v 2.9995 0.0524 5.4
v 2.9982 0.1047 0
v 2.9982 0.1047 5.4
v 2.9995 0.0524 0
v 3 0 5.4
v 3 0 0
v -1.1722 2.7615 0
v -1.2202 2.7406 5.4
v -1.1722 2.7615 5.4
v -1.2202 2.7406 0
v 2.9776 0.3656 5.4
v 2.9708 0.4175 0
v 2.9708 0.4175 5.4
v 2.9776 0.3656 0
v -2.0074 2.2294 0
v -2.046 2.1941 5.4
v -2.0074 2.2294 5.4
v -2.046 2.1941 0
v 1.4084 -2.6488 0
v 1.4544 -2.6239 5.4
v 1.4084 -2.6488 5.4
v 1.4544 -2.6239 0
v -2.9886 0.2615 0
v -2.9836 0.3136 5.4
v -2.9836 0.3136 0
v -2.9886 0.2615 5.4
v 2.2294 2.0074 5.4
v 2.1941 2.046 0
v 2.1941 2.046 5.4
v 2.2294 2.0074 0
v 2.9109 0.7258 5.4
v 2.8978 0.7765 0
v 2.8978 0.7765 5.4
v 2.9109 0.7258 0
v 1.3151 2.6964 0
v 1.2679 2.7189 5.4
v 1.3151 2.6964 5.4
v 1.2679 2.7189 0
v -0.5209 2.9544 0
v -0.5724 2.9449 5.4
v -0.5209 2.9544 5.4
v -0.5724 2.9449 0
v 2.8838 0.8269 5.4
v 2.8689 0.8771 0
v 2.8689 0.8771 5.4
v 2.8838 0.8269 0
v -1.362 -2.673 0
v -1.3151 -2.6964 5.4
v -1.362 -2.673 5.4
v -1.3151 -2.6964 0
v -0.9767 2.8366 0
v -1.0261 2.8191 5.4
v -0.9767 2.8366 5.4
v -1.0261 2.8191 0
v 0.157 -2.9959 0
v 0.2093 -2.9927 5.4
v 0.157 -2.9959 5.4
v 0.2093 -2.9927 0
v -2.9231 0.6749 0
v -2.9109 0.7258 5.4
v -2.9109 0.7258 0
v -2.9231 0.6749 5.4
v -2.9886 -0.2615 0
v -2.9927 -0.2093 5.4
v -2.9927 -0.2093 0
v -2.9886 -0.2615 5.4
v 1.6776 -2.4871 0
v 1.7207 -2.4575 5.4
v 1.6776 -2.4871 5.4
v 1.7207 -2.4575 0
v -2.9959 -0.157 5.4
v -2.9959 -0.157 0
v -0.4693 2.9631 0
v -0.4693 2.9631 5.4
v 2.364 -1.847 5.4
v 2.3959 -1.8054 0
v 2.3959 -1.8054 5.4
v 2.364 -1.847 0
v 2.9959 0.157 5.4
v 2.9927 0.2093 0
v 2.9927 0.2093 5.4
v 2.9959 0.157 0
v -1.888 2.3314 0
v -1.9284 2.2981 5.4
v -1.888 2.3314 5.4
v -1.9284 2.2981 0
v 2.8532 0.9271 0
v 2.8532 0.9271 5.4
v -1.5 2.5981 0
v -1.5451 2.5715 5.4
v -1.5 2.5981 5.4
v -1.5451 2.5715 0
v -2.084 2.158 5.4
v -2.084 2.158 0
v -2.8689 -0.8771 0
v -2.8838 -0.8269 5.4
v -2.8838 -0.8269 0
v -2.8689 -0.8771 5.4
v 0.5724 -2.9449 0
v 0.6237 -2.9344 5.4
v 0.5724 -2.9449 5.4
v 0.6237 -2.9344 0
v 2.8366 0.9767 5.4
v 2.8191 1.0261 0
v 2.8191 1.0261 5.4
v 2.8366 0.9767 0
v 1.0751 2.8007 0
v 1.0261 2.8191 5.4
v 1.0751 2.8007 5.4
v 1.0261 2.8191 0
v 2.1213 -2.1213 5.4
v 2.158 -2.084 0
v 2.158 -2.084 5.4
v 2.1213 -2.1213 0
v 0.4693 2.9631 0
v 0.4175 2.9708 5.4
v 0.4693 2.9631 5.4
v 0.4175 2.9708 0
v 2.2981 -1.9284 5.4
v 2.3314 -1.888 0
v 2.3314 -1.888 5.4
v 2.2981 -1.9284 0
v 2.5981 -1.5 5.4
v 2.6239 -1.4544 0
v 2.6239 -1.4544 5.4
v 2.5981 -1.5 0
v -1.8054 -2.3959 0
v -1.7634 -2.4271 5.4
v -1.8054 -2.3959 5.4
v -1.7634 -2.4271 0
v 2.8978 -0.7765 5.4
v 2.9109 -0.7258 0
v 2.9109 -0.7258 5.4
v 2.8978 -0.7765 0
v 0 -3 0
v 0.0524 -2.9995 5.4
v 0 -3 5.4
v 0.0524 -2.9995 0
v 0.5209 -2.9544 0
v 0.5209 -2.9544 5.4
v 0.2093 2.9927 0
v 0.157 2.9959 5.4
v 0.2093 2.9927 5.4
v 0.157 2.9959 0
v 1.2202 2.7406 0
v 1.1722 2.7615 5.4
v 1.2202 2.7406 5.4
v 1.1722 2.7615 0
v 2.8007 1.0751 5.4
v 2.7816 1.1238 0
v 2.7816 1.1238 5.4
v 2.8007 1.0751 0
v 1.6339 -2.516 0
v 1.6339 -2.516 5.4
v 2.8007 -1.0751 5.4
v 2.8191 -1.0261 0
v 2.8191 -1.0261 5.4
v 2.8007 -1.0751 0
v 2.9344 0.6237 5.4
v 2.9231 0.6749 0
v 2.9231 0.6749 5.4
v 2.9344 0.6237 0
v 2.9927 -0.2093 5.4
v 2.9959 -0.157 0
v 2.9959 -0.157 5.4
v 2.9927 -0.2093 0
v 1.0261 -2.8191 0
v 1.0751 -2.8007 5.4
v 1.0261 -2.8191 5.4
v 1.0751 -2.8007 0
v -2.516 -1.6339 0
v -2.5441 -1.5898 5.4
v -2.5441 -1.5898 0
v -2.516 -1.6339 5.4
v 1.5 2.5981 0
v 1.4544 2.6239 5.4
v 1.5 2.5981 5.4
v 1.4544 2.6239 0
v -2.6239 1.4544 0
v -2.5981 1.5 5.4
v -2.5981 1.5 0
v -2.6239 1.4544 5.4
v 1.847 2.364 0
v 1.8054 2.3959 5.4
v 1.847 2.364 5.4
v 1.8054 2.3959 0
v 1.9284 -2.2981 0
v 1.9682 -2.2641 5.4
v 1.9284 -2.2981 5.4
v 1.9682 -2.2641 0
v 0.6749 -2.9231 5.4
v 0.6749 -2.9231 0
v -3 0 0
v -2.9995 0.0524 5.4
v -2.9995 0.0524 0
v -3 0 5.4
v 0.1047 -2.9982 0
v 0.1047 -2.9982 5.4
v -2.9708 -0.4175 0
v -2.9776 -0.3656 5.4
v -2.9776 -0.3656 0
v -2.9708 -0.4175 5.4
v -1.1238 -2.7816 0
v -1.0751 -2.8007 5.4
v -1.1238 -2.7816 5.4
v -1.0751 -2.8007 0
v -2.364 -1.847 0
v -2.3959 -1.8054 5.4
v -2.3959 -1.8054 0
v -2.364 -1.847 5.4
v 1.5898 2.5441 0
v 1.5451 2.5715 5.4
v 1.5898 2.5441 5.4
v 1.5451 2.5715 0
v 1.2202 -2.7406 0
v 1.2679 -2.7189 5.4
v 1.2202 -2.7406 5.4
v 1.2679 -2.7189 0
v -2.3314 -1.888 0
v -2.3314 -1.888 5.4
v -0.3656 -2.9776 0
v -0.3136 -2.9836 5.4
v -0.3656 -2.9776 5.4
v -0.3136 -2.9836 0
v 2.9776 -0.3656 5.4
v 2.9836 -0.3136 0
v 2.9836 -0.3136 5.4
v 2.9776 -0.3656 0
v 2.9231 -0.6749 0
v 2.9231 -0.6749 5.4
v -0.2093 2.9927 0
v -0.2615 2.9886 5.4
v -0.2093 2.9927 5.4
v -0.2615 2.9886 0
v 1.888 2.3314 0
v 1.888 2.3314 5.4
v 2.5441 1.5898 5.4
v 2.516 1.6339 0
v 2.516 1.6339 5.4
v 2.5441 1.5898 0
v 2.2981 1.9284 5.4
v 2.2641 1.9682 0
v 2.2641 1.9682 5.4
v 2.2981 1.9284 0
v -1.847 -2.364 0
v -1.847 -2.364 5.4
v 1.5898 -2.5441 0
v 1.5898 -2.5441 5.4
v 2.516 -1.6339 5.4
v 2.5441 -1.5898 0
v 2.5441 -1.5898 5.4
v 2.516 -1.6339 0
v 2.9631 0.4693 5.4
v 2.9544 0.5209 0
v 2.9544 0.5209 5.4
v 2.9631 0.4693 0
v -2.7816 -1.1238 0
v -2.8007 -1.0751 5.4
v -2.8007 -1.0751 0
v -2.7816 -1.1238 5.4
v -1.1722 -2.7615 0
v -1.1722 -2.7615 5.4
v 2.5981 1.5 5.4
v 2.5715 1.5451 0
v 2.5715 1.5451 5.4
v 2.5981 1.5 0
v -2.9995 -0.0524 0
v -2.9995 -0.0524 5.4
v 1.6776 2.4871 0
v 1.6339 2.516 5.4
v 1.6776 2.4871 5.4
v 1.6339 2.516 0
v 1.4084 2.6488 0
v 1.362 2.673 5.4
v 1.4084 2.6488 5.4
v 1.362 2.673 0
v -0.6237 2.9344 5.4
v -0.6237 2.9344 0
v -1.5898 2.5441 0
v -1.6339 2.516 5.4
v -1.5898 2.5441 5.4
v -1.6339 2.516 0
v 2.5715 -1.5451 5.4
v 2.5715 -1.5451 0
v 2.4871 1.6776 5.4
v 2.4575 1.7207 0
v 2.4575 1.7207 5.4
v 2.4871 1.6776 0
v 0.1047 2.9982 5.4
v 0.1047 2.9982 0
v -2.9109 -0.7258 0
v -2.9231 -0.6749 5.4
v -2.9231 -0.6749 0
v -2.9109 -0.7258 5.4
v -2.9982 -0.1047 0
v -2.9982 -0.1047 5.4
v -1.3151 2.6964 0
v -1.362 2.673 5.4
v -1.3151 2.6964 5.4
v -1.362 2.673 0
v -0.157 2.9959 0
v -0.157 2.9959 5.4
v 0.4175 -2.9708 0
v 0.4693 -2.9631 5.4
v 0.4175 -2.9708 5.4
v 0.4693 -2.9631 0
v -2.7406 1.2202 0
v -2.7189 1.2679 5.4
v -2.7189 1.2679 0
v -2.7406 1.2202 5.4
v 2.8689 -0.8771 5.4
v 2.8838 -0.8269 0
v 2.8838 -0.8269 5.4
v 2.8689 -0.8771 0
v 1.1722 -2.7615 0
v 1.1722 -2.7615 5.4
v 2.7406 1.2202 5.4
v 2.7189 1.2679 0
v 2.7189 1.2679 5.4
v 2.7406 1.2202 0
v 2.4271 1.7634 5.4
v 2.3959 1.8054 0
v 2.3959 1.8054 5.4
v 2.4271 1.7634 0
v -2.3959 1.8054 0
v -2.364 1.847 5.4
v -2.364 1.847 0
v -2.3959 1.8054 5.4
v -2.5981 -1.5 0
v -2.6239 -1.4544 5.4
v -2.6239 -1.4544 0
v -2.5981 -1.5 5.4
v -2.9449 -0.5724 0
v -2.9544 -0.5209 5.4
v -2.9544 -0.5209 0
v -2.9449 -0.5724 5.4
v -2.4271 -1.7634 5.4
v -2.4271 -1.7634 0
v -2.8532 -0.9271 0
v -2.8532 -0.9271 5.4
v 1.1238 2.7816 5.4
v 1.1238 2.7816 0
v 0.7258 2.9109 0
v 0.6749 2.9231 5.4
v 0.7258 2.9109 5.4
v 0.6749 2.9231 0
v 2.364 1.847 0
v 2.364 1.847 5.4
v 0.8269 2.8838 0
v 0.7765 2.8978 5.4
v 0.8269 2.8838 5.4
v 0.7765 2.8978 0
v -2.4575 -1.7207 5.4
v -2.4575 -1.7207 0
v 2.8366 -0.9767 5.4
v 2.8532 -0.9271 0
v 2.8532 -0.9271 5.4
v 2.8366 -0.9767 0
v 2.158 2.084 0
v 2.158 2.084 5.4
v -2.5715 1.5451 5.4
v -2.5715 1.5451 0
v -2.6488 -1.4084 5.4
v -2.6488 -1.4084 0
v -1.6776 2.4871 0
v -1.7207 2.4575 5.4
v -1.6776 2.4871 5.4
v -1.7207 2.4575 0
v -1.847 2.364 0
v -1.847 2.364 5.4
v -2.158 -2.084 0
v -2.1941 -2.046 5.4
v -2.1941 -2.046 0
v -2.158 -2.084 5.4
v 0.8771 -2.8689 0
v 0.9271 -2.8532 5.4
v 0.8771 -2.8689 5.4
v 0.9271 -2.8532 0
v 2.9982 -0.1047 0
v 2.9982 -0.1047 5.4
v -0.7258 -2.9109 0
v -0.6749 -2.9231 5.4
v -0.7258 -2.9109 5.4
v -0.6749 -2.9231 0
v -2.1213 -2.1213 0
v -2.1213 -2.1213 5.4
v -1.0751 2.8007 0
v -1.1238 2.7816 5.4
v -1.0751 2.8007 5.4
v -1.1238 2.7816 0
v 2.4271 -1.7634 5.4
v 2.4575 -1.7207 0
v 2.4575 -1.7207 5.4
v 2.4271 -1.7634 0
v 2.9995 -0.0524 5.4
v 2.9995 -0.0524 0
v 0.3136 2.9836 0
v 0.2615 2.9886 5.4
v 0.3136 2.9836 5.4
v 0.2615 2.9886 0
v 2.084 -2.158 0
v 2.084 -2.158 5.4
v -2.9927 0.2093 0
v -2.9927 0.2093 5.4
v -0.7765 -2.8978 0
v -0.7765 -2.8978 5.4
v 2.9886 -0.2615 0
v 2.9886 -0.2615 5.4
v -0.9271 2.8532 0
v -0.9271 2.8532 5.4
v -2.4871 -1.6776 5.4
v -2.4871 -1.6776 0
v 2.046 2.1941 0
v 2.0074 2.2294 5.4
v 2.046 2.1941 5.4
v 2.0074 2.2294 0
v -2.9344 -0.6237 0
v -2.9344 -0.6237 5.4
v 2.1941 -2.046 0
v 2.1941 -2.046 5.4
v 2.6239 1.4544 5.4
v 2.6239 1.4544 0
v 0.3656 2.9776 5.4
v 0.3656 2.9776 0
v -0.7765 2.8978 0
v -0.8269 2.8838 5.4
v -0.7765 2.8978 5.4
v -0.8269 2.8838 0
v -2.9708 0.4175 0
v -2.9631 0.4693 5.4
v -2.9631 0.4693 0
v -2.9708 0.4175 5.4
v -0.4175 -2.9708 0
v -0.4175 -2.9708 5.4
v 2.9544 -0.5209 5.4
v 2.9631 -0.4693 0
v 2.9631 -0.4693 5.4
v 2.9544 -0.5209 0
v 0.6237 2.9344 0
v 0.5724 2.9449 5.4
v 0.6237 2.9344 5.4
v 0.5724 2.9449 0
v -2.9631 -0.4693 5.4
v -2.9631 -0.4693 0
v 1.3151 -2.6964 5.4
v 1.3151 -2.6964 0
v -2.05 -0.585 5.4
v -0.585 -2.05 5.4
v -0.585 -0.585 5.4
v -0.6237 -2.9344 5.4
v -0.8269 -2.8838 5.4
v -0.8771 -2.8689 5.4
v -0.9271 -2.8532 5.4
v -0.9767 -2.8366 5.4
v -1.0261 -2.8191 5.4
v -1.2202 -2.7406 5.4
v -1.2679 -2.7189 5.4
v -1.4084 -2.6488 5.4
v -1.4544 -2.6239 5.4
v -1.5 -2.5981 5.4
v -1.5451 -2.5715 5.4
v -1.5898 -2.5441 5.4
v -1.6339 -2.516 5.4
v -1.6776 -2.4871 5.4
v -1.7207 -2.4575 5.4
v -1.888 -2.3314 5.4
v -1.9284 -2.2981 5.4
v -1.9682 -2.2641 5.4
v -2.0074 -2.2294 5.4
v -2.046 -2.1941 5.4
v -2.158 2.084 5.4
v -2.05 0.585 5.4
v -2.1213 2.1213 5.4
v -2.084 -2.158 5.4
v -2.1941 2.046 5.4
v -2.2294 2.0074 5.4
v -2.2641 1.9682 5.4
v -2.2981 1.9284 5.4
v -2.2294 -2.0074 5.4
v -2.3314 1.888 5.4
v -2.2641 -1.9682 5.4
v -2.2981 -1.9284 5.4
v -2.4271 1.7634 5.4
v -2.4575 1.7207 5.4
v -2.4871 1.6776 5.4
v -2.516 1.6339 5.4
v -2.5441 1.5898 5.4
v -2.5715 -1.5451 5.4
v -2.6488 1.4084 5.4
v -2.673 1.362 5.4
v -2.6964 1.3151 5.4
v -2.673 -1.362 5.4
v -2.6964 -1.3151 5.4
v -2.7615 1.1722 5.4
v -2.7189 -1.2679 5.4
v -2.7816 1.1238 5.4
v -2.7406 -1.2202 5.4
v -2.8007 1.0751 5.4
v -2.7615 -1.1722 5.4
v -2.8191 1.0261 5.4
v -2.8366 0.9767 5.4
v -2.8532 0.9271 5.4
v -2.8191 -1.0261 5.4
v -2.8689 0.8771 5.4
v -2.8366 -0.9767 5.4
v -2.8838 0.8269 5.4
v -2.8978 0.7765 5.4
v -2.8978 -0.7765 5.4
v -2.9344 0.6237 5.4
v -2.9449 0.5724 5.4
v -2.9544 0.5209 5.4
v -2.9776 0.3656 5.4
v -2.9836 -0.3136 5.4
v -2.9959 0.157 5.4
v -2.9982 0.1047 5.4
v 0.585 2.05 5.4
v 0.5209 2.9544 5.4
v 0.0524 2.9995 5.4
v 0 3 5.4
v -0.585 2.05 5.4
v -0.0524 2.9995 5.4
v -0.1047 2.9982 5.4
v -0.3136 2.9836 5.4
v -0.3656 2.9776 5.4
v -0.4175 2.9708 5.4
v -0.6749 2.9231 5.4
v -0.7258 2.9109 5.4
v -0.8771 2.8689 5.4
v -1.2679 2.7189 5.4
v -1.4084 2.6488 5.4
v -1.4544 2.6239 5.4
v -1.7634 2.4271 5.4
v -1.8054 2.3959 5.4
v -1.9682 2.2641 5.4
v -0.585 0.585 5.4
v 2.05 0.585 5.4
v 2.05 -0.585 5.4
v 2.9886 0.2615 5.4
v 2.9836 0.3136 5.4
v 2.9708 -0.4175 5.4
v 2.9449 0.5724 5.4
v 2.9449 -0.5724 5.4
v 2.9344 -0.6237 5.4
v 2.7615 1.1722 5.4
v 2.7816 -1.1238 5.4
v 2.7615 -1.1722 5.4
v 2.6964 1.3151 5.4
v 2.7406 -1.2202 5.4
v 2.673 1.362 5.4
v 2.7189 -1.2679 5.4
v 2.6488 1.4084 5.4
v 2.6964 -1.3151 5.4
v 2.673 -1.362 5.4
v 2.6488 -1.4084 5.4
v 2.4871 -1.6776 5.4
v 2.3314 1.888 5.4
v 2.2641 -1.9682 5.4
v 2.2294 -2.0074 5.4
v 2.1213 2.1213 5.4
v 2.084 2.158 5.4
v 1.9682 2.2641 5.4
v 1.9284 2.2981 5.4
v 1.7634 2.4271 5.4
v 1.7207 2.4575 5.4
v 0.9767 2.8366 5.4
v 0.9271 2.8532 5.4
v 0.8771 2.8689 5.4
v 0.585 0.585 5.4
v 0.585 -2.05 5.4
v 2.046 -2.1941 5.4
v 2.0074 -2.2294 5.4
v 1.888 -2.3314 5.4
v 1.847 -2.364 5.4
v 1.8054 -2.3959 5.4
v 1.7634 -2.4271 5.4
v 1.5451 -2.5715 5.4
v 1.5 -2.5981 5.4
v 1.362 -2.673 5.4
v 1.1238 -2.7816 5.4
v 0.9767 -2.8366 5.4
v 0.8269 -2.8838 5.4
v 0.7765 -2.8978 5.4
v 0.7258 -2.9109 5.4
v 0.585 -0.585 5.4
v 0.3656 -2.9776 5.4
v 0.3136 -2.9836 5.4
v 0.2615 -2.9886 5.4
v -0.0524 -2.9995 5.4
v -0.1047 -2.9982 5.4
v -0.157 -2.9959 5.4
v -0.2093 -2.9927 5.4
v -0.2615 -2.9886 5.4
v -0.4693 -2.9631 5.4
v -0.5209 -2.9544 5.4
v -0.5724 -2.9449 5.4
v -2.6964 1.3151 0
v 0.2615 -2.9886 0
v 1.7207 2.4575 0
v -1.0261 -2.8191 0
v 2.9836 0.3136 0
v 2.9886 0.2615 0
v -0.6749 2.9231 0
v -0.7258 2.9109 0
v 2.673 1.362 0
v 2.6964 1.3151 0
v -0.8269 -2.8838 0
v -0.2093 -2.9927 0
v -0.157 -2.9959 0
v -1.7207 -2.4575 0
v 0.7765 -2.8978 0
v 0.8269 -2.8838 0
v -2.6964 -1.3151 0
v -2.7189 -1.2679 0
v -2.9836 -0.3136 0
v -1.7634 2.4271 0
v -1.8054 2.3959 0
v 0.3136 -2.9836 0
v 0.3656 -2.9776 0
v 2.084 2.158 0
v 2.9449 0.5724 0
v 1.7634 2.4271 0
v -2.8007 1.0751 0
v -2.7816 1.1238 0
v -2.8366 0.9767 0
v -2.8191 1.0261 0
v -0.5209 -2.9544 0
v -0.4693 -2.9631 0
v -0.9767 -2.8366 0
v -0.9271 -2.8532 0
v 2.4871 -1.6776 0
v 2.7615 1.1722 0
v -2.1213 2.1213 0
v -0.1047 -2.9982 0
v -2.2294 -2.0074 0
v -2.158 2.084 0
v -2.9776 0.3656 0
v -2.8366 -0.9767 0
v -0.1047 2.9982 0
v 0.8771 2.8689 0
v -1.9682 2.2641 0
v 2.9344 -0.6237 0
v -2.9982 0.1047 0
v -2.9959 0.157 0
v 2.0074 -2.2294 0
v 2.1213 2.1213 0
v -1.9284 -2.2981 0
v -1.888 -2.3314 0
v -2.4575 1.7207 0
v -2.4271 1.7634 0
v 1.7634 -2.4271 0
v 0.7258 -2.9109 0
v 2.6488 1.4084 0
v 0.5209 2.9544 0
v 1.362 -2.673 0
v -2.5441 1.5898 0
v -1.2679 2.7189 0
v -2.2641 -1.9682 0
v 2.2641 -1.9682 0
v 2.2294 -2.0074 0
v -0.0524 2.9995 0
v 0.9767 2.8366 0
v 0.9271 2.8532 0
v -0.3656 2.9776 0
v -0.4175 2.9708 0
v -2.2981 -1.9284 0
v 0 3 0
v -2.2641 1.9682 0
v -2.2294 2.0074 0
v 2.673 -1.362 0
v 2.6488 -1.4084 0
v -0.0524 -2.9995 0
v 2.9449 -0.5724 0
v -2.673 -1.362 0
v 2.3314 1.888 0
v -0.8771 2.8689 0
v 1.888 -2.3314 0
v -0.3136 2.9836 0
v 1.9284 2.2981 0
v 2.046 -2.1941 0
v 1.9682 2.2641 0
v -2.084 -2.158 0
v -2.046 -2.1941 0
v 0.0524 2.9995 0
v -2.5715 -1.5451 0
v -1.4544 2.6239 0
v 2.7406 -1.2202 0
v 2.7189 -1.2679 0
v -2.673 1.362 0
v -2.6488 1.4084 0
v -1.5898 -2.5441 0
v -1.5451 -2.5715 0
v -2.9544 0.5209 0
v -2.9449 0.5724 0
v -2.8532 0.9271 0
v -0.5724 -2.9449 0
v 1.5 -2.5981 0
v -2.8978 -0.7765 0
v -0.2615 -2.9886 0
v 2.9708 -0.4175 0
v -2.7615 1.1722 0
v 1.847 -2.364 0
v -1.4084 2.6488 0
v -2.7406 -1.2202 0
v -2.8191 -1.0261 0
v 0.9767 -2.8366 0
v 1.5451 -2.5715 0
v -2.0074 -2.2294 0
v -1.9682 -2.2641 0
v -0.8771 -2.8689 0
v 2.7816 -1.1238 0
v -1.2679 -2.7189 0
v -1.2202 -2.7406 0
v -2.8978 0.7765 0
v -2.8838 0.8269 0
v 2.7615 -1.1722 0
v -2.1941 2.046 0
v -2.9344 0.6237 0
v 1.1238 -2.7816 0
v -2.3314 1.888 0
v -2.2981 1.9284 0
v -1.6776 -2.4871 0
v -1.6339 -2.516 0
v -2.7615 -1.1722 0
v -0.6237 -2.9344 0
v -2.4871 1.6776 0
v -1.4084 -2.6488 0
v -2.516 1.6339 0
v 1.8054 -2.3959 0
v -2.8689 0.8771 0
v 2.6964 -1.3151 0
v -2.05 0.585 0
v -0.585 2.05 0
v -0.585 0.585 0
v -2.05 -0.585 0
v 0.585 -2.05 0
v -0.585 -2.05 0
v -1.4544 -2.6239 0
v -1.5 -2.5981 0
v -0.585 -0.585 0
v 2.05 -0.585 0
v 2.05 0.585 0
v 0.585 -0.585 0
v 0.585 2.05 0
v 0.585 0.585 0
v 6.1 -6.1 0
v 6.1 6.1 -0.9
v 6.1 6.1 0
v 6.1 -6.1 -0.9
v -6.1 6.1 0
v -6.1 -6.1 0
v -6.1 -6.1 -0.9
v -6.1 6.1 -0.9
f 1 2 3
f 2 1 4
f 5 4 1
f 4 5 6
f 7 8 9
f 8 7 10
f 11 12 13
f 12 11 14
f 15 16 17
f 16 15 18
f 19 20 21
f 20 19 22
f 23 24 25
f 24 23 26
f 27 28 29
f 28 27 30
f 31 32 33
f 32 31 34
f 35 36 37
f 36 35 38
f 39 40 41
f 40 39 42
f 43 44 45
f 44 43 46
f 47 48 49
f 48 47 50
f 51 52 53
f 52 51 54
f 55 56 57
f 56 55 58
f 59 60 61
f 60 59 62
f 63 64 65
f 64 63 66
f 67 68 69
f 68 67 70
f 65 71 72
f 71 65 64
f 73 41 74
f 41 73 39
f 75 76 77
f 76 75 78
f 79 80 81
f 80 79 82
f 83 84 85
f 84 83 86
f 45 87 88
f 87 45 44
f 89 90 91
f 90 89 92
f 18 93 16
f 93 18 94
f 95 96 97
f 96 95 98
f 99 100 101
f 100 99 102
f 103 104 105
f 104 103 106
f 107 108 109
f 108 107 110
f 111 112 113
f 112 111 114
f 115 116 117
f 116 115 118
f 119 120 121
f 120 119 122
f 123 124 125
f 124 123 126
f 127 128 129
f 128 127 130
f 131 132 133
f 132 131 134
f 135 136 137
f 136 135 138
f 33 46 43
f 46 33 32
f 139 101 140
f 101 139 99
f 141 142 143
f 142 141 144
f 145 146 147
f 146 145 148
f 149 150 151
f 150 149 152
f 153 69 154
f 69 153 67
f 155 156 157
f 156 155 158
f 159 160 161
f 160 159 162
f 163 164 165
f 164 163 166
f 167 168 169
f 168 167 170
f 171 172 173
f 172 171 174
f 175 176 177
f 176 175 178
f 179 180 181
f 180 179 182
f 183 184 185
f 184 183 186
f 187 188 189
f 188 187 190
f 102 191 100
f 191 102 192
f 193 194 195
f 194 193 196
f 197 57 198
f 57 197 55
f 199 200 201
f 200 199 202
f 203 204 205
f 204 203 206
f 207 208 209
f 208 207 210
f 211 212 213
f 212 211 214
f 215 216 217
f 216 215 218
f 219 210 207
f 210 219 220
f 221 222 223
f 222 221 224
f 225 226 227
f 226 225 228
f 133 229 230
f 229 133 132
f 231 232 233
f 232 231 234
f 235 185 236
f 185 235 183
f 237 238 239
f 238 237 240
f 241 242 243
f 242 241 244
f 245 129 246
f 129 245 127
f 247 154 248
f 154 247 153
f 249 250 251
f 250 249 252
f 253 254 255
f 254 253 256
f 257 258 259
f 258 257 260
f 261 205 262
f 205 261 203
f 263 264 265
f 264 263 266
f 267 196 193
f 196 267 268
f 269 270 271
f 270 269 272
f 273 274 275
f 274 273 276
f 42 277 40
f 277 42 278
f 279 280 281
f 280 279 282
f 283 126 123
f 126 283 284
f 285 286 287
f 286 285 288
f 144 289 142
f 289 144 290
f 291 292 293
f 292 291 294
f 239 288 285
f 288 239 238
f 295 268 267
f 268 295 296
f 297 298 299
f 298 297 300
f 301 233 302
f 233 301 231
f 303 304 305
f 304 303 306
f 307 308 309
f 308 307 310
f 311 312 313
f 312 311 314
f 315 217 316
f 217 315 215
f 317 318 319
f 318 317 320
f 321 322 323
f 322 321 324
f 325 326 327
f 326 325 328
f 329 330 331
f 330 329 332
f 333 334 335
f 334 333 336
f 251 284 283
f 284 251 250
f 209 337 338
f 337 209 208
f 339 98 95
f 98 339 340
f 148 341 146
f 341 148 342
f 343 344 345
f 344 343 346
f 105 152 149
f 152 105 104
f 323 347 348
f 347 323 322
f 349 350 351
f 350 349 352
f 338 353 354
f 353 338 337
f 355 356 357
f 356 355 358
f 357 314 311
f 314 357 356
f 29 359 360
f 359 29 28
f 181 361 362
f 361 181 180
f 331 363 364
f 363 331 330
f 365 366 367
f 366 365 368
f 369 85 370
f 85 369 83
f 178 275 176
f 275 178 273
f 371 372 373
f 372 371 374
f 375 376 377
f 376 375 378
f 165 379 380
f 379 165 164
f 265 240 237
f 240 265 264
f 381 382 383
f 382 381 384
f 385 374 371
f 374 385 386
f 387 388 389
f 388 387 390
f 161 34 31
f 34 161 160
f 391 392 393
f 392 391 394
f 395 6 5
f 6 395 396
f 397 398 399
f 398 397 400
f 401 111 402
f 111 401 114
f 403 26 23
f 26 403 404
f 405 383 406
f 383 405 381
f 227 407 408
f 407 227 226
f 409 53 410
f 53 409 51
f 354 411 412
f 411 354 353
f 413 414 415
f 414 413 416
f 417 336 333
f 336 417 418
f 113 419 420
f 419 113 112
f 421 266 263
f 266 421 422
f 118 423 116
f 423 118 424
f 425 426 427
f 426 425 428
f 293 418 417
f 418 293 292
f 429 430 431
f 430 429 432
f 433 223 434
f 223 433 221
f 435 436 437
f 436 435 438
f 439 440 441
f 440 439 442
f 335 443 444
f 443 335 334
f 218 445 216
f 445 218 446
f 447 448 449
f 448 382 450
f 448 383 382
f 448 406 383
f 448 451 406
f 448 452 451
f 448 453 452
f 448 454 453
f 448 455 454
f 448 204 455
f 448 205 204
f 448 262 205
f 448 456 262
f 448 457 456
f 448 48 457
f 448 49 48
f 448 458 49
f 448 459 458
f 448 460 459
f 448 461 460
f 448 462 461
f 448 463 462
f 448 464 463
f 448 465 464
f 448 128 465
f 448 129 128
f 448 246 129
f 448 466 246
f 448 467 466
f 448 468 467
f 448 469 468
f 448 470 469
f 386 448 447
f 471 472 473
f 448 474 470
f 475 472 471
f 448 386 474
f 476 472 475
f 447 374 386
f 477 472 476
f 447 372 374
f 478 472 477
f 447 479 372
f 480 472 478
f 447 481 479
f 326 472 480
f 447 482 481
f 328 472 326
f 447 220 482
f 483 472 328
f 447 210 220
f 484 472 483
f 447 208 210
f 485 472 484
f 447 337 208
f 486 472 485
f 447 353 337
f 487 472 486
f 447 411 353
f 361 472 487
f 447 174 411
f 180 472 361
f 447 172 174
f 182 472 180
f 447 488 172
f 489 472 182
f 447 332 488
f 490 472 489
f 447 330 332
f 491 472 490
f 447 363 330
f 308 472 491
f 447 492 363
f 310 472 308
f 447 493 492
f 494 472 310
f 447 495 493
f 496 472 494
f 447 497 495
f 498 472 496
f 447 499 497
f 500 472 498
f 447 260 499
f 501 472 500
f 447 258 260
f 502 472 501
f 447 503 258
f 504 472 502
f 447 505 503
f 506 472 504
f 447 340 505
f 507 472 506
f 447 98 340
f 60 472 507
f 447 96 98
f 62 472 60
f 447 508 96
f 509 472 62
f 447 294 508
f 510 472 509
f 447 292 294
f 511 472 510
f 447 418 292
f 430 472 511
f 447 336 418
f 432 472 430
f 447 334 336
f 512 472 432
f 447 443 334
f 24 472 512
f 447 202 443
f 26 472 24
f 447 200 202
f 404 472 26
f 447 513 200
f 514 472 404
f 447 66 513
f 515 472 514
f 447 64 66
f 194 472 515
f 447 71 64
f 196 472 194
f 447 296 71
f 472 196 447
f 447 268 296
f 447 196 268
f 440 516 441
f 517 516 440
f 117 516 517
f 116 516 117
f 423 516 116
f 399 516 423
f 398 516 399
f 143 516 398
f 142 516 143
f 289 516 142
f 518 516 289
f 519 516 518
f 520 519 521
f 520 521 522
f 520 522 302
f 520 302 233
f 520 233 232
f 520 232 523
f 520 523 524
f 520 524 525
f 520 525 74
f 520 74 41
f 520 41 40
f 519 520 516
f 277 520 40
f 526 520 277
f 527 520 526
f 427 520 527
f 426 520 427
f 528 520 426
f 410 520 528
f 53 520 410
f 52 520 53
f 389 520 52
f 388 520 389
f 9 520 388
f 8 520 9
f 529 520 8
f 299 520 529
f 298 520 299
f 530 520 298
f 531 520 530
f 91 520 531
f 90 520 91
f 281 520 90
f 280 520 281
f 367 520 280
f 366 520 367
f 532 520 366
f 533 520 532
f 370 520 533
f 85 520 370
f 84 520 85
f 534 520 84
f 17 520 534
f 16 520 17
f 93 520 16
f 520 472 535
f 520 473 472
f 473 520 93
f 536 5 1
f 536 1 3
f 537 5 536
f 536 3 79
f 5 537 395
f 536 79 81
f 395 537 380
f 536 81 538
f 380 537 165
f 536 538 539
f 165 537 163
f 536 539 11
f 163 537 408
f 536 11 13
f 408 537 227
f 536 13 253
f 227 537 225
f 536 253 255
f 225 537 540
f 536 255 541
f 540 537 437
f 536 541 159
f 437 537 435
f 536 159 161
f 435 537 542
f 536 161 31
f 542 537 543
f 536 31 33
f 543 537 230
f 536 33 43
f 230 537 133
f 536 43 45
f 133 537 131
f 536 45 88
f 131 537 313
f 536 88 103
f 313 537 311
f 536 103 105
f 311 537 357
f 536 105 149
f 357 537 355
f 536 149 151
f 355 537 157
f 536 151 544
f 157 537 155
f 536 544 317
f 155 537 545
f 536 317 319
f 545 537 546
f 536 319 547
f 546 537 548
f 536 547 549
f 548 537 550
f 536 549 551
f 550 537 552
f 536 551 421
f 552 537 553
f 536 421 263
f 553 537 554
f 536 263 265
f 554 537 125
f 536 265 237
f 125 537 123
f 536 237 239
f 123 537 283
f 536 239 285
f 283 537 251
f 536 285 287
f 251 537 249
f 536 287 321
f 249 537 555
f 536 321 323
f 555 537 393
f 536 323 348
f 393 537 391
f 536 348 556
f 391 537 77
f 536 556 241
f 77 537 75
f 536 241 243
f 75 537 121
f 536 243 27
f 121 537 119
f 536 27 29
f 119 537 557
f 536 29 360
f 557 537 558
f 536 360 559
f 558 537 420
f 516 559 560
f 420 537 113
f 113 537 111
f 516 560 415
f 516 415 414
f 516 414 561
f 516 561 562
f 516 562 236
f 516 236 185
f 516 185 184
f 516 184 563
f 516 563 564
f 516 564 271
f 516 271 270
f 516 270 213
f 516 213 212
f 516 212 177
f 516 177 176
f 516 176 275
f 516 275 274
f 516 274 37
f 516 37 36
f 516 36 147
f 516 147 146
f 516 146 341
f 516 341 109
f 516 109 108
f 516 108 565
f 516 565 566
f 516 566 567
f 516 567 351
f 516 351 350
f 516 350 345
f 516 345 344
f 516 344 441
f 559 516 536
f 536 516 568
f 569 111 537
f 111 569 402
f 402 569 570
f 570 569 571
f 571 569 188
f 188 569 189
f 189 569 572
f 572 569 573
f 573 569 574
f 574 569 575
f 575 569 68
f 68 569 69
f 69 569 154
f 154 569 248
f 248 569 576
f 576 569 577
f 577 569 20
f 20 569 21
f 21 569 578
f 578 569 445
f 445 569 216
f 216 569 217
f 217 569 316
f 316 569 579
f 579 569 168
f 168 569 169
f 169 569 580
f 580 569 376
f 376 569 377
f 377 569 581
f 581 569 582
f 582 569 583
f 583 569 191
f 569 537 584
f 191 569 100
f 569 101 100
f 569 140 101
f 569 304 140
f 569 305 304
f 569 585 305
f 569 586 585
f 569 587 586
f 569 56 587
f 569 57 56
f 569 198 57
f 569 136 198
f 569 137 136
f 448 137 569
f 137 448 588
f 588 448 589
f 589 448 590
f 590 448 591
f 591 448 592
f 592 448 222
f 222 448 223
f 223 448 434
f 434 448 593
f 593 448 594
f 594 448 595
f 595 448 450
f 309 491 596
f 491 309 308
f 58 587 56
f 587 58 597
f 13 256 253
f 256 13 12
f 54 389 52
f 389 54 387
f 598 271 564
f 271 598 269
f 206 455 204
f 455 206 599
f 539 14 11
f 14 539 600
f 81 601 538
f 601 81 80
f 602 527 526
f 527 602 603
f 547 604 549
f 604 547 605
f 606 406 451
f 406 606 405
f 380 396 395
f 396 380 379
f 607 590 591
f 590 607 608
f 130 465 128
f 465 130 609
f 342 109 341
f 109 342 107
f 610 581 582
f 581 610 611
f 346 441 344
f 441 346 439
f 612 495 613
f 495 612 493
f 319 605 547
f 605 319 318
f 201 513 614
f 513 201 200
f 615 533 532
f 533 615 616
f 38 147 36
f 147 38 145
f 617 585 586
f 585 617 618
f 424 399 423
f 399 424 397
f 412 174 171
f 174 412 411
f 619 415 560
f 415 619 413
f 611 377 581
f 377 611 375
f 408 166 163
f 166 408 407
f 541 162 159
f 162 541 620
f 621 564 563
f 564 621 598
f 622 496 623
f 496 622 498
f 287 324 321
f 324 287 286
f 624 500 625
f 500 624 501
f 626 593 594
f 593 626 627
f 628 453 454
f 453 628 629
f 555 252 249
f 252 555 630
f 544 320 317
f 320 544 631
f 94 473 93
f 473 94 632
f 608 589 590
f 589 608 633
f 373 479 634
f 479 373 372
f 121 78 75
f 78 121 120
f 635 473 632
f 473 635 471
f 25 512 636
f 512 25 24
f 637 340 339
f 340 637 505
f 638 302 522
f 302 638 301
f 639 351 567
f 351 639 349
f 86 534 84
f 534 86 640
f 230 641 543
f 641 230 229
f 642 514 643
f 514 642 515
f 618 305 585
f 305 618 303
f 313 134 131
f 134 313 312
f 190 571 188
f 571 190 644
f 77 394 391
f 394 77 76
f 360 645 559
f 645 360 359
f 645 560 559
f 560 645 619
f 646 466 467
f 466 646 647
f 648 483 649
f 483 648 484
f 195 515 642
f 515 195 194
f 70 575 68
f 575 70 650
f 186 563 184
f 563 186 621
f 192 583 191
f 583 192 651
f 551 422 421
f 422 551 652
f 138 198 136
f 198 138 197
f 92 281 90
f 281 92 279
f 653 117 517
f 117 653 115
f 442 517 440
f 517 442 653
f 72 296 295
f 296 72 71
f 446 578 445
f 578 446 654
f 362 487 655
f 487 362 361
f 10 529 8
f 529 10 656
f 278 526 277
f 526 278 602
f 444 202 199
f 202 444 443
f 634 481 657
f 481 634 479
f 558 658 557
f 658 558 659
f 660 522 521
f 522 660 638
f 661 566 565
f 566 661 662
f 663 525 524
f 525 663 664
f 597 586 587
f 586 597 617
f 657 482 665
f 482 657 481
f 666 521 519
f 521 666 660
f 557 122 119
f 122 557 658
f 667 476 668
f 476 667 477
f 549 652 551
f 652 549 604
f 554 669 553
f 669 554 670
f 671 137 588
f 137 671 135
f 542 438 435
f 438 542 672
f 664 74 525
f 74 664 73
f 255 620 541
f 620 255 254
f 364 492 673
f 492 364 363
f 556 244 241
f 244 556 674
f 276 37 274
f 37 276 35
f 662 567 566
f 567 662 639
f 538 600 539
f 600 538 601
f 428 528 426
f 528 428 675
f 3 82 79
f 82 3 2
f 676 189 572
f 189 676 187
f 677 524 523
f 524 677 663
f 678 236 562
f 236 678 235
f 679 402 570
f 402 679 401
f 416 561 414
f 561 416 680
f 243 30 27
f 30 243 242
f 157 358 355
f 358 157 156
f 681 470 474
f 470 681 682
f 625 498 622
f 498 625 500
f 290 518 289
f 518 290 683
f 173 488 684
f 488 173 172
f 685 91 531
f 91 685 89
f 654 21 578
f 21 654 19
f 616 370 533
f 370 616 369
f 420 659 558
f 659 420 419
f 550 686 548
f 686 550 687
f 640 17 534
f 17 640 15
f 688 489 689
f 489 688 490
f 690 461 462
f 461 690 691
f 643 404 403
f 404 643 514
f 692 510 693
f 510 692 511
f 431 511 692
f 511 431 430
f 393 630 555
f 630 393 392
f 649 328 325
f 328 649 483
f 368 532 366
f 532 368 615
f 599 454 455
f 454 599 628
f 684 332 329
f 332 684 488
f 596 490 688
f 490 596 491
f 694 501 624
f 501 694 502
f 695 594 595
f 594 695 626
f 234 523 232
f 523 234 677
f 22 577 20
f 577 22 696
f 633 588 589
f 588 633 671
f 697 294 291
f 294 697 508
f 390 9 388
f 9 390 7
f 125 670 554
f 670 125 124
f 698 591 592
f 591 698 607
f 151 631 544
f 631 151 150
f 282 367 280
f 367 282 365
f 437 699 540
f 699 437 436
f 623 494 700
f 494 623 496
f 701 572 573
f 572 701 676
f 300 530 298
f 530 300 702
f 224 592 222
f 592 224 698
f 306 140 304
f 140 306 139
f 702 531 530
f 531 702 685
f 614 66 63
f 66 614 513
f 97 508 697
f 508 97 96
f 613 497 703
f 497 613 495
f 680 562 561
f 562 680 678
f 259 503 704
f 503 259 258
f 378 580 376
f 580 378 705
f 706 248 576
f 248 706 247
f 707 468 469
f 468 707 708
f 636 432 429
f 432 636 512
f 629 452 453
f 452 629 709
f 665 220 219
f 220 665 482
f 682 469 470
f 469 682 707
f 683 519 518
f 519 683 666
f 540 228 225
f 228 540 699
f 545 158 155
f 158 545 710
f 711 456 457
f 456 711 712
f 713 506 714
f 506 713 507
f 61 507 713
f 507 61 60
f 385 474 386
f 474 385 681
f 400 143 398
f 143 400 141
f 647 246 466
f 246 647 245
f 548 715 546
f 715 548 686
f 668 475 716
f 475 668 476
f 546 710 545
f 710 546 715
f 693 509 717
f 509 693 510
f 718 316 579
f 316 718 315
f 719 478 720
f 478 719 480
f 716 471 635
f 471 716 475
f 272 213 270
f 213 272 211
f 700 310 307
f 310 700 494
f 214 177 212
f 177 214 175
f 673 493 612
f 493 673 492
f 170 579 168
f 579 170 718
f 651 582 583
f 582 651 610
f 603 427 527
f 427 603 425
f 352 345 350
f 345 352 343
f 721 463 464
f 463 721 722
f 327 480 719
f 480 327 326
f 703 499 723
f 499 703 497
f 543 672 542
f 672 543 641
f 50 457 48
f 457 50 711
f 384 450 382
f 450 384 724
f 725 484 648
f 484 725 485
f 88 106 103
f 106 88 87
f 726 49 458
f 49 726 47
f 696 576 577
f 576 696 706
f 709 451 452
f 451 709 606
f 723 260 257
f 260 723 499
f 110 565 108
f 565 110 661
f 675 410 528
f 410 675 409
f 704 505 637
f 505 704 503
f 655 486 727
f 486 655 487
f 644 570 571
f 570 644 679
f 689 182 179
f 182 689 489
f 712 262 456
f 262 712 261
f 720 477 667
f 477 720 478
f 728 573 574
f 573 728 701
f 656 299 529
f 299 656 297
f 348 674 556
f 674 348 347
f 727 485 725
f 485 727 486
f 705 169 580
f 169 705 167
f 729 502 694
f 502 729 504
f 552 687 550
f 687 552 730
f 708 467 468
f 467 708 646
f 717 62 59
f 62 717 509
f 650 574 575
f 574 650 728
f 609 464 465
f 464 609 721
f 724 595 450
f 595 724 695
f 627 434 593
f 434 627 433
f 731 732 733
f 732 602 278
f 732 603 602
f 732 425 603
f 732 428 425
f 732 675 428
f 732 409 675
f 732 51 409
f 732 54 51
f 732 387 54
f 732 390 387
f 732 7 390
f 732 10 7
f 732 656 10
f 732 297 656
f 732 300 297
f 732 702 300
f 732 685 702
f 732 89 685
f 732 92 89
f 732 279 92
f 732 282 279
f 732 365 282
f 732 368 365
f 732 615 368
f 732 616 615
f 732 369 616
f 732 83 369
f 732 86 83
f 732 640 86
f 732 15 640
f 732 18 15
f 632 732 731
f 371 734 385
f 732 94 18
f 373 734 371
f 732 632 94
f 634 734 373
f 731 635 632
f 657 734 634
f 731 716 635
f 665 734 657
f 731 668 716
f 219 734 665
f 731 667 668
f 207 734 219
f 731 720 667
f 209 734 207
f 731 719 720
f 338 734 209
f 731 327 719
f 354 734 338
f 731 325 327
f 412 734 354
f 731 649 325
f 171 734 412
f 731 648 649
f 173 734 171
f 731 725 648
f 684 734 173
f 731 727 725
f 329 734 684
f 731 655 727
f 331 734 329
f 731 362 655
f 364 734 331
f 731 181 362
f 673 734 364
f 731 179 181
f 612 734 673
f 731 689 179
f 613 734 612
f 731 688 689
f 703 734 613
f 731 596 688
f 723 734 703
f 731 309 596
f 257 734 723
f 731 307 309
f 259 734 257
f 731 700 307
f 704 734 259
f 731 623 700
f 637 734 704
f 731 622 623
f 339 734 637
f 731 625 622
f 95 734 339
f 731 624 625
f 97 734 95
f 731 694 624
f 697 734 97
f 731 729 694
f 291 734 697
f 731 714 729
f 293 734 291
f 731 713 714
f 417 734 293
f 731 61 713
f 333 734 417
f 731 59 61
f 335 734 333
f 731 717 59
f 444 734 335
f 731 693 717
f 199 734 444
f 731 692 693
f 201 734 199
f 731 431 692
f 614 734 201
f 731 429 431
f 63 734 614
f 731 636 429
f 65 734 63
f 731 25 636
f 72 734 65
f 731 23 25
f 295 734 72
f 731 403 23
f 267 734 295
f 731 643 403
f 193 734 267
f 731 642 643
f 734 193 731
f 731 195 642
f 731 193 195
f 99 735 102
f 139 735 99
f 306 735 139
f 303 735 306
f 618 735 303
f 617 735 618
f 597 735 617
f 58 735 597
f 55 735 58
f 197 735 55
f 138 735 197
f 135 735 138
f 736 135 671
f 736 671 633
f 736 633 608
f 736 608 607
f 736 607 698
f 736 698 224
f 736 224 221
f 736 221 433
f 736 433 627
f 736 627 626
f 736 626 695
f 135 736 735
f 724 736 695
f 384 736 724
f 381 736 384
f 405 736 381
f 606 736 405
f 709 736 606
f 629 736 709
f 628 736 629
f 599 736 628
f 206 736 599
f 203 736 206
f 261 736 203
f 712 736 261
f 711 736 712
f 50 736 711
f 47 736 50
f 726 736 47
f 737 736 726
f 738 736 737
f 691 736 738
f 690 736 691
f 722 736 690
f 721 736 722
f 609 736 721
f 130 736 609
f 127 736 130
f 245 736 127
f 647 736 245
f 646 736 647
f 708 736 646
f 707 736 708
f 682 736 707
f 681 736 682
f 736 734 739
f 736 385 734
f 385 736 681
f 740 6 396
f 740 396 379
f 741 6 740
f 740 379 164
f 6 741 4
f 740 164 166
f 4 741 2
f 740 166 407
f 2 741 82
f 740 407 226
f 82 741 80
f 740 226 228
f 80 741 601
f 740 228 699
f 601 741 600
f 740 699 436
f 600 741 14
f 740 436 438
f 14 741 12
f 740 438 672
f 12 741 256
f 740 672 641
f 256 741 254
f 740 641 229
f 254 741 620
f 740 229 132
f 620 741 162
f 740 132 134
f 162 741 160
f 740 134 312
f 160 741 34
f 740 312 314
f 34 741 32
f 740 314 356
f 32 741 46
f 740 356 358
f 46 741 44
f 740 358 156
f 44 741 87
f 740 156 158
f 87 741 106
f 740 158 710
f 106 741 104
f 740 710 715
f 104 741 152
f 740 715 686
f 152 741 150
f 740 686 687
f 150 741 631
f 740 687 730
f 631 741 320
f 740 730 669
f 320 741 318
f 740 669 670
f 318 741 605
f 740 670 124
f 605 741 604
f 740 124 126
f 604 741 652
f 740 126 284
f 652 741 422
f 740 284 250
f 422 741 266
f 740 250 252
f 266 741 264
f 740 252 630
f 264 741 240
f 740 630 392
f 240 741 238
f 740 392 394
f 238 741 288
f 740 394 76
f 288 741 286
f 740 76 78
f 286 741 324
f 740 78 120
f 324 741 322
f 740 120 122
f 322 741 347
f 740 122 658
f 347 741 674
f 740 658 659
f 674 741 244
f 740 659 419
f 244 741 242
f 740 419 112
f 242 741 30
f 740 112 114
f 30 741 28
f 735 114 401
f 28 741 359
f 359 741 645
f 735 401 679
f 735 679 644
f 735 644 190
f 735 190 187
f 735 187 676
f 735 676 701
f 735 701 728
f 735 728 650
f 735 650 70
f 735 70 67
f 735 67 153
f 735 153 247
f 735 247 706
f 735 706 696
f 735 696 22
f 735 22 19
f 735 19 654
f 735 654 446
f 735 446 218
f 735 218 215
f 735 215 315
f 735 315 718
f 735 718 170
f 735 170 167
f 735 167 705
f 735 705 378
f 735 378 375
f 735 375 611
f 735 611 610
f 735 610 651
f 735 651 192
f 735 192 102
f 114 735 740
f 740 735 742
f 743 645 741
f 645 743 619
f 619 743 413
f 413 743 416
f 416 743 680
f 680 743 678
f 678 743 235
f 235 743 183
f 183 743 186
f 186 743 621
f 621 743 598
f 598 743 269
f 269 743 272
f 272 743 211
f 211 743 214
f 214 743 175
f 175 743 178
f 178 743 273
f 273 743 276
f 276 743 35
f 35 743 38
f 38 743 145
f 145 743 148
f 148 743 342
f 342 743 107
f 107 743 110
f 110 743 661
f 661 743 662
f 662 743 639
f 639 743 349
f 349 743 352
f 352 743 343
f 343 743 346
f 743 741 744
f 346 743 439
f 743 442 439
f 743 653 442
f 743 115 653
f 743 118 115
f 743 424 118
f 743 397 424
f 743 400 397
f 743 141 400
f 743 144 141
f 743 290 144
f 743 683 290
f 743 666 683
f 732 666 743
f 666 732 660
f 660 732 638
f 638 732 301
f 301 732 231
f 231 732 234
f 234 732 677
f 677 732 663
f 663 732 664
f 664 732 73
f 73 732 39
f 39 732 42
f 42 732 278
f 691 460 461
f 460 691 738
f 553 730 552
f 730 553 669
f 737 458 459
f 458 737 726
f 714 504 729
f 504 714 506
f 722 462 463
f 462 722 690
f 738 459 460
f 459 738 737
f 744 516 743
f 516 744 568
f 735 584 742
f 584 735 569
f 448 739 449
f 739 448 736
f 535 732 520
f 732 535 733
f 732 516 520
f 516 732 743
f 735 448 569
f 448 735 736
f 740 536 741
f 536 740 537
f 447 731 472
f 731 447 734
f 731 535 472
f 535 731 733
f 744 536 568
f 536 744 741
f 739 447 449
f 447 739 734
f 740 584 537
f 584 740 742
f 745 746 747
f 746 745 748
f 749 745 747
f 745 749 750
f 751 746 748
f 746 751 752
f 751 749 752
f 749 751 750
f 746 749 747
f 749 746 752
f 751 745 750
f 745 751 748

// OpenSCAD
/**
* based on http://deskthority.net/w/images/c/c8/Cherry_MX_1%C3%971_keycap_specification_%281983%29.pdf
* TODO: find better source, and/or measure several brands.
*
* v.1
* 2014-May-26
*/

baseplate();
mx_mount();

/** a simple plane where to develop the keycap on top of
* NOTE: the depth of 0.95mm... it shouldn't matter because you should build
* your keycap on top of it. If not expanding the geometry with more plastic
* there, but instead using as a base for a wooden keycap cup or some
* other crazy idea, use the minimum your material/printer
* will be comfortable with
*/
module baseplate(){
	translate( [0,0, -0.9/2] )
		cube( size=[12.2,12.2,0.9], center=true );
}

/**
* The female part of the steam.
* NOTE: i'm not 100% sure on the height, as the drawing I found does not have
* it measured... and i can't infer it with full confidence when
* just accounting for the other measurements. the drawing os probably more
* concerned with the keycap per se.
*/
module mx_mount(){
	//mx_height = 4.7; // measured from an actual CM storm cap
	mx_height = 5.4;
	translate( [0,0,mx_height/2] ){
		difference(){
			cylinder( h=mx_height, r=6/2, center=true, $fn=360 );
				cube( size=[1.17,4.1,mx_height+2], center=true );
				cube( size=[4.1,1.17,mx_height+2], center=true );
		}
	}
}

module mx_mount_solid(){
	//mx_height = 4.7; // measured from an actual CM storm cap
	mx_height = 5.4;
	translate( [0,0,mx_height/2] ){
		//difference(){
			cylinder( h=mx_height, r=6/2, center=true, $fn=360 );
		//}
	}
}
